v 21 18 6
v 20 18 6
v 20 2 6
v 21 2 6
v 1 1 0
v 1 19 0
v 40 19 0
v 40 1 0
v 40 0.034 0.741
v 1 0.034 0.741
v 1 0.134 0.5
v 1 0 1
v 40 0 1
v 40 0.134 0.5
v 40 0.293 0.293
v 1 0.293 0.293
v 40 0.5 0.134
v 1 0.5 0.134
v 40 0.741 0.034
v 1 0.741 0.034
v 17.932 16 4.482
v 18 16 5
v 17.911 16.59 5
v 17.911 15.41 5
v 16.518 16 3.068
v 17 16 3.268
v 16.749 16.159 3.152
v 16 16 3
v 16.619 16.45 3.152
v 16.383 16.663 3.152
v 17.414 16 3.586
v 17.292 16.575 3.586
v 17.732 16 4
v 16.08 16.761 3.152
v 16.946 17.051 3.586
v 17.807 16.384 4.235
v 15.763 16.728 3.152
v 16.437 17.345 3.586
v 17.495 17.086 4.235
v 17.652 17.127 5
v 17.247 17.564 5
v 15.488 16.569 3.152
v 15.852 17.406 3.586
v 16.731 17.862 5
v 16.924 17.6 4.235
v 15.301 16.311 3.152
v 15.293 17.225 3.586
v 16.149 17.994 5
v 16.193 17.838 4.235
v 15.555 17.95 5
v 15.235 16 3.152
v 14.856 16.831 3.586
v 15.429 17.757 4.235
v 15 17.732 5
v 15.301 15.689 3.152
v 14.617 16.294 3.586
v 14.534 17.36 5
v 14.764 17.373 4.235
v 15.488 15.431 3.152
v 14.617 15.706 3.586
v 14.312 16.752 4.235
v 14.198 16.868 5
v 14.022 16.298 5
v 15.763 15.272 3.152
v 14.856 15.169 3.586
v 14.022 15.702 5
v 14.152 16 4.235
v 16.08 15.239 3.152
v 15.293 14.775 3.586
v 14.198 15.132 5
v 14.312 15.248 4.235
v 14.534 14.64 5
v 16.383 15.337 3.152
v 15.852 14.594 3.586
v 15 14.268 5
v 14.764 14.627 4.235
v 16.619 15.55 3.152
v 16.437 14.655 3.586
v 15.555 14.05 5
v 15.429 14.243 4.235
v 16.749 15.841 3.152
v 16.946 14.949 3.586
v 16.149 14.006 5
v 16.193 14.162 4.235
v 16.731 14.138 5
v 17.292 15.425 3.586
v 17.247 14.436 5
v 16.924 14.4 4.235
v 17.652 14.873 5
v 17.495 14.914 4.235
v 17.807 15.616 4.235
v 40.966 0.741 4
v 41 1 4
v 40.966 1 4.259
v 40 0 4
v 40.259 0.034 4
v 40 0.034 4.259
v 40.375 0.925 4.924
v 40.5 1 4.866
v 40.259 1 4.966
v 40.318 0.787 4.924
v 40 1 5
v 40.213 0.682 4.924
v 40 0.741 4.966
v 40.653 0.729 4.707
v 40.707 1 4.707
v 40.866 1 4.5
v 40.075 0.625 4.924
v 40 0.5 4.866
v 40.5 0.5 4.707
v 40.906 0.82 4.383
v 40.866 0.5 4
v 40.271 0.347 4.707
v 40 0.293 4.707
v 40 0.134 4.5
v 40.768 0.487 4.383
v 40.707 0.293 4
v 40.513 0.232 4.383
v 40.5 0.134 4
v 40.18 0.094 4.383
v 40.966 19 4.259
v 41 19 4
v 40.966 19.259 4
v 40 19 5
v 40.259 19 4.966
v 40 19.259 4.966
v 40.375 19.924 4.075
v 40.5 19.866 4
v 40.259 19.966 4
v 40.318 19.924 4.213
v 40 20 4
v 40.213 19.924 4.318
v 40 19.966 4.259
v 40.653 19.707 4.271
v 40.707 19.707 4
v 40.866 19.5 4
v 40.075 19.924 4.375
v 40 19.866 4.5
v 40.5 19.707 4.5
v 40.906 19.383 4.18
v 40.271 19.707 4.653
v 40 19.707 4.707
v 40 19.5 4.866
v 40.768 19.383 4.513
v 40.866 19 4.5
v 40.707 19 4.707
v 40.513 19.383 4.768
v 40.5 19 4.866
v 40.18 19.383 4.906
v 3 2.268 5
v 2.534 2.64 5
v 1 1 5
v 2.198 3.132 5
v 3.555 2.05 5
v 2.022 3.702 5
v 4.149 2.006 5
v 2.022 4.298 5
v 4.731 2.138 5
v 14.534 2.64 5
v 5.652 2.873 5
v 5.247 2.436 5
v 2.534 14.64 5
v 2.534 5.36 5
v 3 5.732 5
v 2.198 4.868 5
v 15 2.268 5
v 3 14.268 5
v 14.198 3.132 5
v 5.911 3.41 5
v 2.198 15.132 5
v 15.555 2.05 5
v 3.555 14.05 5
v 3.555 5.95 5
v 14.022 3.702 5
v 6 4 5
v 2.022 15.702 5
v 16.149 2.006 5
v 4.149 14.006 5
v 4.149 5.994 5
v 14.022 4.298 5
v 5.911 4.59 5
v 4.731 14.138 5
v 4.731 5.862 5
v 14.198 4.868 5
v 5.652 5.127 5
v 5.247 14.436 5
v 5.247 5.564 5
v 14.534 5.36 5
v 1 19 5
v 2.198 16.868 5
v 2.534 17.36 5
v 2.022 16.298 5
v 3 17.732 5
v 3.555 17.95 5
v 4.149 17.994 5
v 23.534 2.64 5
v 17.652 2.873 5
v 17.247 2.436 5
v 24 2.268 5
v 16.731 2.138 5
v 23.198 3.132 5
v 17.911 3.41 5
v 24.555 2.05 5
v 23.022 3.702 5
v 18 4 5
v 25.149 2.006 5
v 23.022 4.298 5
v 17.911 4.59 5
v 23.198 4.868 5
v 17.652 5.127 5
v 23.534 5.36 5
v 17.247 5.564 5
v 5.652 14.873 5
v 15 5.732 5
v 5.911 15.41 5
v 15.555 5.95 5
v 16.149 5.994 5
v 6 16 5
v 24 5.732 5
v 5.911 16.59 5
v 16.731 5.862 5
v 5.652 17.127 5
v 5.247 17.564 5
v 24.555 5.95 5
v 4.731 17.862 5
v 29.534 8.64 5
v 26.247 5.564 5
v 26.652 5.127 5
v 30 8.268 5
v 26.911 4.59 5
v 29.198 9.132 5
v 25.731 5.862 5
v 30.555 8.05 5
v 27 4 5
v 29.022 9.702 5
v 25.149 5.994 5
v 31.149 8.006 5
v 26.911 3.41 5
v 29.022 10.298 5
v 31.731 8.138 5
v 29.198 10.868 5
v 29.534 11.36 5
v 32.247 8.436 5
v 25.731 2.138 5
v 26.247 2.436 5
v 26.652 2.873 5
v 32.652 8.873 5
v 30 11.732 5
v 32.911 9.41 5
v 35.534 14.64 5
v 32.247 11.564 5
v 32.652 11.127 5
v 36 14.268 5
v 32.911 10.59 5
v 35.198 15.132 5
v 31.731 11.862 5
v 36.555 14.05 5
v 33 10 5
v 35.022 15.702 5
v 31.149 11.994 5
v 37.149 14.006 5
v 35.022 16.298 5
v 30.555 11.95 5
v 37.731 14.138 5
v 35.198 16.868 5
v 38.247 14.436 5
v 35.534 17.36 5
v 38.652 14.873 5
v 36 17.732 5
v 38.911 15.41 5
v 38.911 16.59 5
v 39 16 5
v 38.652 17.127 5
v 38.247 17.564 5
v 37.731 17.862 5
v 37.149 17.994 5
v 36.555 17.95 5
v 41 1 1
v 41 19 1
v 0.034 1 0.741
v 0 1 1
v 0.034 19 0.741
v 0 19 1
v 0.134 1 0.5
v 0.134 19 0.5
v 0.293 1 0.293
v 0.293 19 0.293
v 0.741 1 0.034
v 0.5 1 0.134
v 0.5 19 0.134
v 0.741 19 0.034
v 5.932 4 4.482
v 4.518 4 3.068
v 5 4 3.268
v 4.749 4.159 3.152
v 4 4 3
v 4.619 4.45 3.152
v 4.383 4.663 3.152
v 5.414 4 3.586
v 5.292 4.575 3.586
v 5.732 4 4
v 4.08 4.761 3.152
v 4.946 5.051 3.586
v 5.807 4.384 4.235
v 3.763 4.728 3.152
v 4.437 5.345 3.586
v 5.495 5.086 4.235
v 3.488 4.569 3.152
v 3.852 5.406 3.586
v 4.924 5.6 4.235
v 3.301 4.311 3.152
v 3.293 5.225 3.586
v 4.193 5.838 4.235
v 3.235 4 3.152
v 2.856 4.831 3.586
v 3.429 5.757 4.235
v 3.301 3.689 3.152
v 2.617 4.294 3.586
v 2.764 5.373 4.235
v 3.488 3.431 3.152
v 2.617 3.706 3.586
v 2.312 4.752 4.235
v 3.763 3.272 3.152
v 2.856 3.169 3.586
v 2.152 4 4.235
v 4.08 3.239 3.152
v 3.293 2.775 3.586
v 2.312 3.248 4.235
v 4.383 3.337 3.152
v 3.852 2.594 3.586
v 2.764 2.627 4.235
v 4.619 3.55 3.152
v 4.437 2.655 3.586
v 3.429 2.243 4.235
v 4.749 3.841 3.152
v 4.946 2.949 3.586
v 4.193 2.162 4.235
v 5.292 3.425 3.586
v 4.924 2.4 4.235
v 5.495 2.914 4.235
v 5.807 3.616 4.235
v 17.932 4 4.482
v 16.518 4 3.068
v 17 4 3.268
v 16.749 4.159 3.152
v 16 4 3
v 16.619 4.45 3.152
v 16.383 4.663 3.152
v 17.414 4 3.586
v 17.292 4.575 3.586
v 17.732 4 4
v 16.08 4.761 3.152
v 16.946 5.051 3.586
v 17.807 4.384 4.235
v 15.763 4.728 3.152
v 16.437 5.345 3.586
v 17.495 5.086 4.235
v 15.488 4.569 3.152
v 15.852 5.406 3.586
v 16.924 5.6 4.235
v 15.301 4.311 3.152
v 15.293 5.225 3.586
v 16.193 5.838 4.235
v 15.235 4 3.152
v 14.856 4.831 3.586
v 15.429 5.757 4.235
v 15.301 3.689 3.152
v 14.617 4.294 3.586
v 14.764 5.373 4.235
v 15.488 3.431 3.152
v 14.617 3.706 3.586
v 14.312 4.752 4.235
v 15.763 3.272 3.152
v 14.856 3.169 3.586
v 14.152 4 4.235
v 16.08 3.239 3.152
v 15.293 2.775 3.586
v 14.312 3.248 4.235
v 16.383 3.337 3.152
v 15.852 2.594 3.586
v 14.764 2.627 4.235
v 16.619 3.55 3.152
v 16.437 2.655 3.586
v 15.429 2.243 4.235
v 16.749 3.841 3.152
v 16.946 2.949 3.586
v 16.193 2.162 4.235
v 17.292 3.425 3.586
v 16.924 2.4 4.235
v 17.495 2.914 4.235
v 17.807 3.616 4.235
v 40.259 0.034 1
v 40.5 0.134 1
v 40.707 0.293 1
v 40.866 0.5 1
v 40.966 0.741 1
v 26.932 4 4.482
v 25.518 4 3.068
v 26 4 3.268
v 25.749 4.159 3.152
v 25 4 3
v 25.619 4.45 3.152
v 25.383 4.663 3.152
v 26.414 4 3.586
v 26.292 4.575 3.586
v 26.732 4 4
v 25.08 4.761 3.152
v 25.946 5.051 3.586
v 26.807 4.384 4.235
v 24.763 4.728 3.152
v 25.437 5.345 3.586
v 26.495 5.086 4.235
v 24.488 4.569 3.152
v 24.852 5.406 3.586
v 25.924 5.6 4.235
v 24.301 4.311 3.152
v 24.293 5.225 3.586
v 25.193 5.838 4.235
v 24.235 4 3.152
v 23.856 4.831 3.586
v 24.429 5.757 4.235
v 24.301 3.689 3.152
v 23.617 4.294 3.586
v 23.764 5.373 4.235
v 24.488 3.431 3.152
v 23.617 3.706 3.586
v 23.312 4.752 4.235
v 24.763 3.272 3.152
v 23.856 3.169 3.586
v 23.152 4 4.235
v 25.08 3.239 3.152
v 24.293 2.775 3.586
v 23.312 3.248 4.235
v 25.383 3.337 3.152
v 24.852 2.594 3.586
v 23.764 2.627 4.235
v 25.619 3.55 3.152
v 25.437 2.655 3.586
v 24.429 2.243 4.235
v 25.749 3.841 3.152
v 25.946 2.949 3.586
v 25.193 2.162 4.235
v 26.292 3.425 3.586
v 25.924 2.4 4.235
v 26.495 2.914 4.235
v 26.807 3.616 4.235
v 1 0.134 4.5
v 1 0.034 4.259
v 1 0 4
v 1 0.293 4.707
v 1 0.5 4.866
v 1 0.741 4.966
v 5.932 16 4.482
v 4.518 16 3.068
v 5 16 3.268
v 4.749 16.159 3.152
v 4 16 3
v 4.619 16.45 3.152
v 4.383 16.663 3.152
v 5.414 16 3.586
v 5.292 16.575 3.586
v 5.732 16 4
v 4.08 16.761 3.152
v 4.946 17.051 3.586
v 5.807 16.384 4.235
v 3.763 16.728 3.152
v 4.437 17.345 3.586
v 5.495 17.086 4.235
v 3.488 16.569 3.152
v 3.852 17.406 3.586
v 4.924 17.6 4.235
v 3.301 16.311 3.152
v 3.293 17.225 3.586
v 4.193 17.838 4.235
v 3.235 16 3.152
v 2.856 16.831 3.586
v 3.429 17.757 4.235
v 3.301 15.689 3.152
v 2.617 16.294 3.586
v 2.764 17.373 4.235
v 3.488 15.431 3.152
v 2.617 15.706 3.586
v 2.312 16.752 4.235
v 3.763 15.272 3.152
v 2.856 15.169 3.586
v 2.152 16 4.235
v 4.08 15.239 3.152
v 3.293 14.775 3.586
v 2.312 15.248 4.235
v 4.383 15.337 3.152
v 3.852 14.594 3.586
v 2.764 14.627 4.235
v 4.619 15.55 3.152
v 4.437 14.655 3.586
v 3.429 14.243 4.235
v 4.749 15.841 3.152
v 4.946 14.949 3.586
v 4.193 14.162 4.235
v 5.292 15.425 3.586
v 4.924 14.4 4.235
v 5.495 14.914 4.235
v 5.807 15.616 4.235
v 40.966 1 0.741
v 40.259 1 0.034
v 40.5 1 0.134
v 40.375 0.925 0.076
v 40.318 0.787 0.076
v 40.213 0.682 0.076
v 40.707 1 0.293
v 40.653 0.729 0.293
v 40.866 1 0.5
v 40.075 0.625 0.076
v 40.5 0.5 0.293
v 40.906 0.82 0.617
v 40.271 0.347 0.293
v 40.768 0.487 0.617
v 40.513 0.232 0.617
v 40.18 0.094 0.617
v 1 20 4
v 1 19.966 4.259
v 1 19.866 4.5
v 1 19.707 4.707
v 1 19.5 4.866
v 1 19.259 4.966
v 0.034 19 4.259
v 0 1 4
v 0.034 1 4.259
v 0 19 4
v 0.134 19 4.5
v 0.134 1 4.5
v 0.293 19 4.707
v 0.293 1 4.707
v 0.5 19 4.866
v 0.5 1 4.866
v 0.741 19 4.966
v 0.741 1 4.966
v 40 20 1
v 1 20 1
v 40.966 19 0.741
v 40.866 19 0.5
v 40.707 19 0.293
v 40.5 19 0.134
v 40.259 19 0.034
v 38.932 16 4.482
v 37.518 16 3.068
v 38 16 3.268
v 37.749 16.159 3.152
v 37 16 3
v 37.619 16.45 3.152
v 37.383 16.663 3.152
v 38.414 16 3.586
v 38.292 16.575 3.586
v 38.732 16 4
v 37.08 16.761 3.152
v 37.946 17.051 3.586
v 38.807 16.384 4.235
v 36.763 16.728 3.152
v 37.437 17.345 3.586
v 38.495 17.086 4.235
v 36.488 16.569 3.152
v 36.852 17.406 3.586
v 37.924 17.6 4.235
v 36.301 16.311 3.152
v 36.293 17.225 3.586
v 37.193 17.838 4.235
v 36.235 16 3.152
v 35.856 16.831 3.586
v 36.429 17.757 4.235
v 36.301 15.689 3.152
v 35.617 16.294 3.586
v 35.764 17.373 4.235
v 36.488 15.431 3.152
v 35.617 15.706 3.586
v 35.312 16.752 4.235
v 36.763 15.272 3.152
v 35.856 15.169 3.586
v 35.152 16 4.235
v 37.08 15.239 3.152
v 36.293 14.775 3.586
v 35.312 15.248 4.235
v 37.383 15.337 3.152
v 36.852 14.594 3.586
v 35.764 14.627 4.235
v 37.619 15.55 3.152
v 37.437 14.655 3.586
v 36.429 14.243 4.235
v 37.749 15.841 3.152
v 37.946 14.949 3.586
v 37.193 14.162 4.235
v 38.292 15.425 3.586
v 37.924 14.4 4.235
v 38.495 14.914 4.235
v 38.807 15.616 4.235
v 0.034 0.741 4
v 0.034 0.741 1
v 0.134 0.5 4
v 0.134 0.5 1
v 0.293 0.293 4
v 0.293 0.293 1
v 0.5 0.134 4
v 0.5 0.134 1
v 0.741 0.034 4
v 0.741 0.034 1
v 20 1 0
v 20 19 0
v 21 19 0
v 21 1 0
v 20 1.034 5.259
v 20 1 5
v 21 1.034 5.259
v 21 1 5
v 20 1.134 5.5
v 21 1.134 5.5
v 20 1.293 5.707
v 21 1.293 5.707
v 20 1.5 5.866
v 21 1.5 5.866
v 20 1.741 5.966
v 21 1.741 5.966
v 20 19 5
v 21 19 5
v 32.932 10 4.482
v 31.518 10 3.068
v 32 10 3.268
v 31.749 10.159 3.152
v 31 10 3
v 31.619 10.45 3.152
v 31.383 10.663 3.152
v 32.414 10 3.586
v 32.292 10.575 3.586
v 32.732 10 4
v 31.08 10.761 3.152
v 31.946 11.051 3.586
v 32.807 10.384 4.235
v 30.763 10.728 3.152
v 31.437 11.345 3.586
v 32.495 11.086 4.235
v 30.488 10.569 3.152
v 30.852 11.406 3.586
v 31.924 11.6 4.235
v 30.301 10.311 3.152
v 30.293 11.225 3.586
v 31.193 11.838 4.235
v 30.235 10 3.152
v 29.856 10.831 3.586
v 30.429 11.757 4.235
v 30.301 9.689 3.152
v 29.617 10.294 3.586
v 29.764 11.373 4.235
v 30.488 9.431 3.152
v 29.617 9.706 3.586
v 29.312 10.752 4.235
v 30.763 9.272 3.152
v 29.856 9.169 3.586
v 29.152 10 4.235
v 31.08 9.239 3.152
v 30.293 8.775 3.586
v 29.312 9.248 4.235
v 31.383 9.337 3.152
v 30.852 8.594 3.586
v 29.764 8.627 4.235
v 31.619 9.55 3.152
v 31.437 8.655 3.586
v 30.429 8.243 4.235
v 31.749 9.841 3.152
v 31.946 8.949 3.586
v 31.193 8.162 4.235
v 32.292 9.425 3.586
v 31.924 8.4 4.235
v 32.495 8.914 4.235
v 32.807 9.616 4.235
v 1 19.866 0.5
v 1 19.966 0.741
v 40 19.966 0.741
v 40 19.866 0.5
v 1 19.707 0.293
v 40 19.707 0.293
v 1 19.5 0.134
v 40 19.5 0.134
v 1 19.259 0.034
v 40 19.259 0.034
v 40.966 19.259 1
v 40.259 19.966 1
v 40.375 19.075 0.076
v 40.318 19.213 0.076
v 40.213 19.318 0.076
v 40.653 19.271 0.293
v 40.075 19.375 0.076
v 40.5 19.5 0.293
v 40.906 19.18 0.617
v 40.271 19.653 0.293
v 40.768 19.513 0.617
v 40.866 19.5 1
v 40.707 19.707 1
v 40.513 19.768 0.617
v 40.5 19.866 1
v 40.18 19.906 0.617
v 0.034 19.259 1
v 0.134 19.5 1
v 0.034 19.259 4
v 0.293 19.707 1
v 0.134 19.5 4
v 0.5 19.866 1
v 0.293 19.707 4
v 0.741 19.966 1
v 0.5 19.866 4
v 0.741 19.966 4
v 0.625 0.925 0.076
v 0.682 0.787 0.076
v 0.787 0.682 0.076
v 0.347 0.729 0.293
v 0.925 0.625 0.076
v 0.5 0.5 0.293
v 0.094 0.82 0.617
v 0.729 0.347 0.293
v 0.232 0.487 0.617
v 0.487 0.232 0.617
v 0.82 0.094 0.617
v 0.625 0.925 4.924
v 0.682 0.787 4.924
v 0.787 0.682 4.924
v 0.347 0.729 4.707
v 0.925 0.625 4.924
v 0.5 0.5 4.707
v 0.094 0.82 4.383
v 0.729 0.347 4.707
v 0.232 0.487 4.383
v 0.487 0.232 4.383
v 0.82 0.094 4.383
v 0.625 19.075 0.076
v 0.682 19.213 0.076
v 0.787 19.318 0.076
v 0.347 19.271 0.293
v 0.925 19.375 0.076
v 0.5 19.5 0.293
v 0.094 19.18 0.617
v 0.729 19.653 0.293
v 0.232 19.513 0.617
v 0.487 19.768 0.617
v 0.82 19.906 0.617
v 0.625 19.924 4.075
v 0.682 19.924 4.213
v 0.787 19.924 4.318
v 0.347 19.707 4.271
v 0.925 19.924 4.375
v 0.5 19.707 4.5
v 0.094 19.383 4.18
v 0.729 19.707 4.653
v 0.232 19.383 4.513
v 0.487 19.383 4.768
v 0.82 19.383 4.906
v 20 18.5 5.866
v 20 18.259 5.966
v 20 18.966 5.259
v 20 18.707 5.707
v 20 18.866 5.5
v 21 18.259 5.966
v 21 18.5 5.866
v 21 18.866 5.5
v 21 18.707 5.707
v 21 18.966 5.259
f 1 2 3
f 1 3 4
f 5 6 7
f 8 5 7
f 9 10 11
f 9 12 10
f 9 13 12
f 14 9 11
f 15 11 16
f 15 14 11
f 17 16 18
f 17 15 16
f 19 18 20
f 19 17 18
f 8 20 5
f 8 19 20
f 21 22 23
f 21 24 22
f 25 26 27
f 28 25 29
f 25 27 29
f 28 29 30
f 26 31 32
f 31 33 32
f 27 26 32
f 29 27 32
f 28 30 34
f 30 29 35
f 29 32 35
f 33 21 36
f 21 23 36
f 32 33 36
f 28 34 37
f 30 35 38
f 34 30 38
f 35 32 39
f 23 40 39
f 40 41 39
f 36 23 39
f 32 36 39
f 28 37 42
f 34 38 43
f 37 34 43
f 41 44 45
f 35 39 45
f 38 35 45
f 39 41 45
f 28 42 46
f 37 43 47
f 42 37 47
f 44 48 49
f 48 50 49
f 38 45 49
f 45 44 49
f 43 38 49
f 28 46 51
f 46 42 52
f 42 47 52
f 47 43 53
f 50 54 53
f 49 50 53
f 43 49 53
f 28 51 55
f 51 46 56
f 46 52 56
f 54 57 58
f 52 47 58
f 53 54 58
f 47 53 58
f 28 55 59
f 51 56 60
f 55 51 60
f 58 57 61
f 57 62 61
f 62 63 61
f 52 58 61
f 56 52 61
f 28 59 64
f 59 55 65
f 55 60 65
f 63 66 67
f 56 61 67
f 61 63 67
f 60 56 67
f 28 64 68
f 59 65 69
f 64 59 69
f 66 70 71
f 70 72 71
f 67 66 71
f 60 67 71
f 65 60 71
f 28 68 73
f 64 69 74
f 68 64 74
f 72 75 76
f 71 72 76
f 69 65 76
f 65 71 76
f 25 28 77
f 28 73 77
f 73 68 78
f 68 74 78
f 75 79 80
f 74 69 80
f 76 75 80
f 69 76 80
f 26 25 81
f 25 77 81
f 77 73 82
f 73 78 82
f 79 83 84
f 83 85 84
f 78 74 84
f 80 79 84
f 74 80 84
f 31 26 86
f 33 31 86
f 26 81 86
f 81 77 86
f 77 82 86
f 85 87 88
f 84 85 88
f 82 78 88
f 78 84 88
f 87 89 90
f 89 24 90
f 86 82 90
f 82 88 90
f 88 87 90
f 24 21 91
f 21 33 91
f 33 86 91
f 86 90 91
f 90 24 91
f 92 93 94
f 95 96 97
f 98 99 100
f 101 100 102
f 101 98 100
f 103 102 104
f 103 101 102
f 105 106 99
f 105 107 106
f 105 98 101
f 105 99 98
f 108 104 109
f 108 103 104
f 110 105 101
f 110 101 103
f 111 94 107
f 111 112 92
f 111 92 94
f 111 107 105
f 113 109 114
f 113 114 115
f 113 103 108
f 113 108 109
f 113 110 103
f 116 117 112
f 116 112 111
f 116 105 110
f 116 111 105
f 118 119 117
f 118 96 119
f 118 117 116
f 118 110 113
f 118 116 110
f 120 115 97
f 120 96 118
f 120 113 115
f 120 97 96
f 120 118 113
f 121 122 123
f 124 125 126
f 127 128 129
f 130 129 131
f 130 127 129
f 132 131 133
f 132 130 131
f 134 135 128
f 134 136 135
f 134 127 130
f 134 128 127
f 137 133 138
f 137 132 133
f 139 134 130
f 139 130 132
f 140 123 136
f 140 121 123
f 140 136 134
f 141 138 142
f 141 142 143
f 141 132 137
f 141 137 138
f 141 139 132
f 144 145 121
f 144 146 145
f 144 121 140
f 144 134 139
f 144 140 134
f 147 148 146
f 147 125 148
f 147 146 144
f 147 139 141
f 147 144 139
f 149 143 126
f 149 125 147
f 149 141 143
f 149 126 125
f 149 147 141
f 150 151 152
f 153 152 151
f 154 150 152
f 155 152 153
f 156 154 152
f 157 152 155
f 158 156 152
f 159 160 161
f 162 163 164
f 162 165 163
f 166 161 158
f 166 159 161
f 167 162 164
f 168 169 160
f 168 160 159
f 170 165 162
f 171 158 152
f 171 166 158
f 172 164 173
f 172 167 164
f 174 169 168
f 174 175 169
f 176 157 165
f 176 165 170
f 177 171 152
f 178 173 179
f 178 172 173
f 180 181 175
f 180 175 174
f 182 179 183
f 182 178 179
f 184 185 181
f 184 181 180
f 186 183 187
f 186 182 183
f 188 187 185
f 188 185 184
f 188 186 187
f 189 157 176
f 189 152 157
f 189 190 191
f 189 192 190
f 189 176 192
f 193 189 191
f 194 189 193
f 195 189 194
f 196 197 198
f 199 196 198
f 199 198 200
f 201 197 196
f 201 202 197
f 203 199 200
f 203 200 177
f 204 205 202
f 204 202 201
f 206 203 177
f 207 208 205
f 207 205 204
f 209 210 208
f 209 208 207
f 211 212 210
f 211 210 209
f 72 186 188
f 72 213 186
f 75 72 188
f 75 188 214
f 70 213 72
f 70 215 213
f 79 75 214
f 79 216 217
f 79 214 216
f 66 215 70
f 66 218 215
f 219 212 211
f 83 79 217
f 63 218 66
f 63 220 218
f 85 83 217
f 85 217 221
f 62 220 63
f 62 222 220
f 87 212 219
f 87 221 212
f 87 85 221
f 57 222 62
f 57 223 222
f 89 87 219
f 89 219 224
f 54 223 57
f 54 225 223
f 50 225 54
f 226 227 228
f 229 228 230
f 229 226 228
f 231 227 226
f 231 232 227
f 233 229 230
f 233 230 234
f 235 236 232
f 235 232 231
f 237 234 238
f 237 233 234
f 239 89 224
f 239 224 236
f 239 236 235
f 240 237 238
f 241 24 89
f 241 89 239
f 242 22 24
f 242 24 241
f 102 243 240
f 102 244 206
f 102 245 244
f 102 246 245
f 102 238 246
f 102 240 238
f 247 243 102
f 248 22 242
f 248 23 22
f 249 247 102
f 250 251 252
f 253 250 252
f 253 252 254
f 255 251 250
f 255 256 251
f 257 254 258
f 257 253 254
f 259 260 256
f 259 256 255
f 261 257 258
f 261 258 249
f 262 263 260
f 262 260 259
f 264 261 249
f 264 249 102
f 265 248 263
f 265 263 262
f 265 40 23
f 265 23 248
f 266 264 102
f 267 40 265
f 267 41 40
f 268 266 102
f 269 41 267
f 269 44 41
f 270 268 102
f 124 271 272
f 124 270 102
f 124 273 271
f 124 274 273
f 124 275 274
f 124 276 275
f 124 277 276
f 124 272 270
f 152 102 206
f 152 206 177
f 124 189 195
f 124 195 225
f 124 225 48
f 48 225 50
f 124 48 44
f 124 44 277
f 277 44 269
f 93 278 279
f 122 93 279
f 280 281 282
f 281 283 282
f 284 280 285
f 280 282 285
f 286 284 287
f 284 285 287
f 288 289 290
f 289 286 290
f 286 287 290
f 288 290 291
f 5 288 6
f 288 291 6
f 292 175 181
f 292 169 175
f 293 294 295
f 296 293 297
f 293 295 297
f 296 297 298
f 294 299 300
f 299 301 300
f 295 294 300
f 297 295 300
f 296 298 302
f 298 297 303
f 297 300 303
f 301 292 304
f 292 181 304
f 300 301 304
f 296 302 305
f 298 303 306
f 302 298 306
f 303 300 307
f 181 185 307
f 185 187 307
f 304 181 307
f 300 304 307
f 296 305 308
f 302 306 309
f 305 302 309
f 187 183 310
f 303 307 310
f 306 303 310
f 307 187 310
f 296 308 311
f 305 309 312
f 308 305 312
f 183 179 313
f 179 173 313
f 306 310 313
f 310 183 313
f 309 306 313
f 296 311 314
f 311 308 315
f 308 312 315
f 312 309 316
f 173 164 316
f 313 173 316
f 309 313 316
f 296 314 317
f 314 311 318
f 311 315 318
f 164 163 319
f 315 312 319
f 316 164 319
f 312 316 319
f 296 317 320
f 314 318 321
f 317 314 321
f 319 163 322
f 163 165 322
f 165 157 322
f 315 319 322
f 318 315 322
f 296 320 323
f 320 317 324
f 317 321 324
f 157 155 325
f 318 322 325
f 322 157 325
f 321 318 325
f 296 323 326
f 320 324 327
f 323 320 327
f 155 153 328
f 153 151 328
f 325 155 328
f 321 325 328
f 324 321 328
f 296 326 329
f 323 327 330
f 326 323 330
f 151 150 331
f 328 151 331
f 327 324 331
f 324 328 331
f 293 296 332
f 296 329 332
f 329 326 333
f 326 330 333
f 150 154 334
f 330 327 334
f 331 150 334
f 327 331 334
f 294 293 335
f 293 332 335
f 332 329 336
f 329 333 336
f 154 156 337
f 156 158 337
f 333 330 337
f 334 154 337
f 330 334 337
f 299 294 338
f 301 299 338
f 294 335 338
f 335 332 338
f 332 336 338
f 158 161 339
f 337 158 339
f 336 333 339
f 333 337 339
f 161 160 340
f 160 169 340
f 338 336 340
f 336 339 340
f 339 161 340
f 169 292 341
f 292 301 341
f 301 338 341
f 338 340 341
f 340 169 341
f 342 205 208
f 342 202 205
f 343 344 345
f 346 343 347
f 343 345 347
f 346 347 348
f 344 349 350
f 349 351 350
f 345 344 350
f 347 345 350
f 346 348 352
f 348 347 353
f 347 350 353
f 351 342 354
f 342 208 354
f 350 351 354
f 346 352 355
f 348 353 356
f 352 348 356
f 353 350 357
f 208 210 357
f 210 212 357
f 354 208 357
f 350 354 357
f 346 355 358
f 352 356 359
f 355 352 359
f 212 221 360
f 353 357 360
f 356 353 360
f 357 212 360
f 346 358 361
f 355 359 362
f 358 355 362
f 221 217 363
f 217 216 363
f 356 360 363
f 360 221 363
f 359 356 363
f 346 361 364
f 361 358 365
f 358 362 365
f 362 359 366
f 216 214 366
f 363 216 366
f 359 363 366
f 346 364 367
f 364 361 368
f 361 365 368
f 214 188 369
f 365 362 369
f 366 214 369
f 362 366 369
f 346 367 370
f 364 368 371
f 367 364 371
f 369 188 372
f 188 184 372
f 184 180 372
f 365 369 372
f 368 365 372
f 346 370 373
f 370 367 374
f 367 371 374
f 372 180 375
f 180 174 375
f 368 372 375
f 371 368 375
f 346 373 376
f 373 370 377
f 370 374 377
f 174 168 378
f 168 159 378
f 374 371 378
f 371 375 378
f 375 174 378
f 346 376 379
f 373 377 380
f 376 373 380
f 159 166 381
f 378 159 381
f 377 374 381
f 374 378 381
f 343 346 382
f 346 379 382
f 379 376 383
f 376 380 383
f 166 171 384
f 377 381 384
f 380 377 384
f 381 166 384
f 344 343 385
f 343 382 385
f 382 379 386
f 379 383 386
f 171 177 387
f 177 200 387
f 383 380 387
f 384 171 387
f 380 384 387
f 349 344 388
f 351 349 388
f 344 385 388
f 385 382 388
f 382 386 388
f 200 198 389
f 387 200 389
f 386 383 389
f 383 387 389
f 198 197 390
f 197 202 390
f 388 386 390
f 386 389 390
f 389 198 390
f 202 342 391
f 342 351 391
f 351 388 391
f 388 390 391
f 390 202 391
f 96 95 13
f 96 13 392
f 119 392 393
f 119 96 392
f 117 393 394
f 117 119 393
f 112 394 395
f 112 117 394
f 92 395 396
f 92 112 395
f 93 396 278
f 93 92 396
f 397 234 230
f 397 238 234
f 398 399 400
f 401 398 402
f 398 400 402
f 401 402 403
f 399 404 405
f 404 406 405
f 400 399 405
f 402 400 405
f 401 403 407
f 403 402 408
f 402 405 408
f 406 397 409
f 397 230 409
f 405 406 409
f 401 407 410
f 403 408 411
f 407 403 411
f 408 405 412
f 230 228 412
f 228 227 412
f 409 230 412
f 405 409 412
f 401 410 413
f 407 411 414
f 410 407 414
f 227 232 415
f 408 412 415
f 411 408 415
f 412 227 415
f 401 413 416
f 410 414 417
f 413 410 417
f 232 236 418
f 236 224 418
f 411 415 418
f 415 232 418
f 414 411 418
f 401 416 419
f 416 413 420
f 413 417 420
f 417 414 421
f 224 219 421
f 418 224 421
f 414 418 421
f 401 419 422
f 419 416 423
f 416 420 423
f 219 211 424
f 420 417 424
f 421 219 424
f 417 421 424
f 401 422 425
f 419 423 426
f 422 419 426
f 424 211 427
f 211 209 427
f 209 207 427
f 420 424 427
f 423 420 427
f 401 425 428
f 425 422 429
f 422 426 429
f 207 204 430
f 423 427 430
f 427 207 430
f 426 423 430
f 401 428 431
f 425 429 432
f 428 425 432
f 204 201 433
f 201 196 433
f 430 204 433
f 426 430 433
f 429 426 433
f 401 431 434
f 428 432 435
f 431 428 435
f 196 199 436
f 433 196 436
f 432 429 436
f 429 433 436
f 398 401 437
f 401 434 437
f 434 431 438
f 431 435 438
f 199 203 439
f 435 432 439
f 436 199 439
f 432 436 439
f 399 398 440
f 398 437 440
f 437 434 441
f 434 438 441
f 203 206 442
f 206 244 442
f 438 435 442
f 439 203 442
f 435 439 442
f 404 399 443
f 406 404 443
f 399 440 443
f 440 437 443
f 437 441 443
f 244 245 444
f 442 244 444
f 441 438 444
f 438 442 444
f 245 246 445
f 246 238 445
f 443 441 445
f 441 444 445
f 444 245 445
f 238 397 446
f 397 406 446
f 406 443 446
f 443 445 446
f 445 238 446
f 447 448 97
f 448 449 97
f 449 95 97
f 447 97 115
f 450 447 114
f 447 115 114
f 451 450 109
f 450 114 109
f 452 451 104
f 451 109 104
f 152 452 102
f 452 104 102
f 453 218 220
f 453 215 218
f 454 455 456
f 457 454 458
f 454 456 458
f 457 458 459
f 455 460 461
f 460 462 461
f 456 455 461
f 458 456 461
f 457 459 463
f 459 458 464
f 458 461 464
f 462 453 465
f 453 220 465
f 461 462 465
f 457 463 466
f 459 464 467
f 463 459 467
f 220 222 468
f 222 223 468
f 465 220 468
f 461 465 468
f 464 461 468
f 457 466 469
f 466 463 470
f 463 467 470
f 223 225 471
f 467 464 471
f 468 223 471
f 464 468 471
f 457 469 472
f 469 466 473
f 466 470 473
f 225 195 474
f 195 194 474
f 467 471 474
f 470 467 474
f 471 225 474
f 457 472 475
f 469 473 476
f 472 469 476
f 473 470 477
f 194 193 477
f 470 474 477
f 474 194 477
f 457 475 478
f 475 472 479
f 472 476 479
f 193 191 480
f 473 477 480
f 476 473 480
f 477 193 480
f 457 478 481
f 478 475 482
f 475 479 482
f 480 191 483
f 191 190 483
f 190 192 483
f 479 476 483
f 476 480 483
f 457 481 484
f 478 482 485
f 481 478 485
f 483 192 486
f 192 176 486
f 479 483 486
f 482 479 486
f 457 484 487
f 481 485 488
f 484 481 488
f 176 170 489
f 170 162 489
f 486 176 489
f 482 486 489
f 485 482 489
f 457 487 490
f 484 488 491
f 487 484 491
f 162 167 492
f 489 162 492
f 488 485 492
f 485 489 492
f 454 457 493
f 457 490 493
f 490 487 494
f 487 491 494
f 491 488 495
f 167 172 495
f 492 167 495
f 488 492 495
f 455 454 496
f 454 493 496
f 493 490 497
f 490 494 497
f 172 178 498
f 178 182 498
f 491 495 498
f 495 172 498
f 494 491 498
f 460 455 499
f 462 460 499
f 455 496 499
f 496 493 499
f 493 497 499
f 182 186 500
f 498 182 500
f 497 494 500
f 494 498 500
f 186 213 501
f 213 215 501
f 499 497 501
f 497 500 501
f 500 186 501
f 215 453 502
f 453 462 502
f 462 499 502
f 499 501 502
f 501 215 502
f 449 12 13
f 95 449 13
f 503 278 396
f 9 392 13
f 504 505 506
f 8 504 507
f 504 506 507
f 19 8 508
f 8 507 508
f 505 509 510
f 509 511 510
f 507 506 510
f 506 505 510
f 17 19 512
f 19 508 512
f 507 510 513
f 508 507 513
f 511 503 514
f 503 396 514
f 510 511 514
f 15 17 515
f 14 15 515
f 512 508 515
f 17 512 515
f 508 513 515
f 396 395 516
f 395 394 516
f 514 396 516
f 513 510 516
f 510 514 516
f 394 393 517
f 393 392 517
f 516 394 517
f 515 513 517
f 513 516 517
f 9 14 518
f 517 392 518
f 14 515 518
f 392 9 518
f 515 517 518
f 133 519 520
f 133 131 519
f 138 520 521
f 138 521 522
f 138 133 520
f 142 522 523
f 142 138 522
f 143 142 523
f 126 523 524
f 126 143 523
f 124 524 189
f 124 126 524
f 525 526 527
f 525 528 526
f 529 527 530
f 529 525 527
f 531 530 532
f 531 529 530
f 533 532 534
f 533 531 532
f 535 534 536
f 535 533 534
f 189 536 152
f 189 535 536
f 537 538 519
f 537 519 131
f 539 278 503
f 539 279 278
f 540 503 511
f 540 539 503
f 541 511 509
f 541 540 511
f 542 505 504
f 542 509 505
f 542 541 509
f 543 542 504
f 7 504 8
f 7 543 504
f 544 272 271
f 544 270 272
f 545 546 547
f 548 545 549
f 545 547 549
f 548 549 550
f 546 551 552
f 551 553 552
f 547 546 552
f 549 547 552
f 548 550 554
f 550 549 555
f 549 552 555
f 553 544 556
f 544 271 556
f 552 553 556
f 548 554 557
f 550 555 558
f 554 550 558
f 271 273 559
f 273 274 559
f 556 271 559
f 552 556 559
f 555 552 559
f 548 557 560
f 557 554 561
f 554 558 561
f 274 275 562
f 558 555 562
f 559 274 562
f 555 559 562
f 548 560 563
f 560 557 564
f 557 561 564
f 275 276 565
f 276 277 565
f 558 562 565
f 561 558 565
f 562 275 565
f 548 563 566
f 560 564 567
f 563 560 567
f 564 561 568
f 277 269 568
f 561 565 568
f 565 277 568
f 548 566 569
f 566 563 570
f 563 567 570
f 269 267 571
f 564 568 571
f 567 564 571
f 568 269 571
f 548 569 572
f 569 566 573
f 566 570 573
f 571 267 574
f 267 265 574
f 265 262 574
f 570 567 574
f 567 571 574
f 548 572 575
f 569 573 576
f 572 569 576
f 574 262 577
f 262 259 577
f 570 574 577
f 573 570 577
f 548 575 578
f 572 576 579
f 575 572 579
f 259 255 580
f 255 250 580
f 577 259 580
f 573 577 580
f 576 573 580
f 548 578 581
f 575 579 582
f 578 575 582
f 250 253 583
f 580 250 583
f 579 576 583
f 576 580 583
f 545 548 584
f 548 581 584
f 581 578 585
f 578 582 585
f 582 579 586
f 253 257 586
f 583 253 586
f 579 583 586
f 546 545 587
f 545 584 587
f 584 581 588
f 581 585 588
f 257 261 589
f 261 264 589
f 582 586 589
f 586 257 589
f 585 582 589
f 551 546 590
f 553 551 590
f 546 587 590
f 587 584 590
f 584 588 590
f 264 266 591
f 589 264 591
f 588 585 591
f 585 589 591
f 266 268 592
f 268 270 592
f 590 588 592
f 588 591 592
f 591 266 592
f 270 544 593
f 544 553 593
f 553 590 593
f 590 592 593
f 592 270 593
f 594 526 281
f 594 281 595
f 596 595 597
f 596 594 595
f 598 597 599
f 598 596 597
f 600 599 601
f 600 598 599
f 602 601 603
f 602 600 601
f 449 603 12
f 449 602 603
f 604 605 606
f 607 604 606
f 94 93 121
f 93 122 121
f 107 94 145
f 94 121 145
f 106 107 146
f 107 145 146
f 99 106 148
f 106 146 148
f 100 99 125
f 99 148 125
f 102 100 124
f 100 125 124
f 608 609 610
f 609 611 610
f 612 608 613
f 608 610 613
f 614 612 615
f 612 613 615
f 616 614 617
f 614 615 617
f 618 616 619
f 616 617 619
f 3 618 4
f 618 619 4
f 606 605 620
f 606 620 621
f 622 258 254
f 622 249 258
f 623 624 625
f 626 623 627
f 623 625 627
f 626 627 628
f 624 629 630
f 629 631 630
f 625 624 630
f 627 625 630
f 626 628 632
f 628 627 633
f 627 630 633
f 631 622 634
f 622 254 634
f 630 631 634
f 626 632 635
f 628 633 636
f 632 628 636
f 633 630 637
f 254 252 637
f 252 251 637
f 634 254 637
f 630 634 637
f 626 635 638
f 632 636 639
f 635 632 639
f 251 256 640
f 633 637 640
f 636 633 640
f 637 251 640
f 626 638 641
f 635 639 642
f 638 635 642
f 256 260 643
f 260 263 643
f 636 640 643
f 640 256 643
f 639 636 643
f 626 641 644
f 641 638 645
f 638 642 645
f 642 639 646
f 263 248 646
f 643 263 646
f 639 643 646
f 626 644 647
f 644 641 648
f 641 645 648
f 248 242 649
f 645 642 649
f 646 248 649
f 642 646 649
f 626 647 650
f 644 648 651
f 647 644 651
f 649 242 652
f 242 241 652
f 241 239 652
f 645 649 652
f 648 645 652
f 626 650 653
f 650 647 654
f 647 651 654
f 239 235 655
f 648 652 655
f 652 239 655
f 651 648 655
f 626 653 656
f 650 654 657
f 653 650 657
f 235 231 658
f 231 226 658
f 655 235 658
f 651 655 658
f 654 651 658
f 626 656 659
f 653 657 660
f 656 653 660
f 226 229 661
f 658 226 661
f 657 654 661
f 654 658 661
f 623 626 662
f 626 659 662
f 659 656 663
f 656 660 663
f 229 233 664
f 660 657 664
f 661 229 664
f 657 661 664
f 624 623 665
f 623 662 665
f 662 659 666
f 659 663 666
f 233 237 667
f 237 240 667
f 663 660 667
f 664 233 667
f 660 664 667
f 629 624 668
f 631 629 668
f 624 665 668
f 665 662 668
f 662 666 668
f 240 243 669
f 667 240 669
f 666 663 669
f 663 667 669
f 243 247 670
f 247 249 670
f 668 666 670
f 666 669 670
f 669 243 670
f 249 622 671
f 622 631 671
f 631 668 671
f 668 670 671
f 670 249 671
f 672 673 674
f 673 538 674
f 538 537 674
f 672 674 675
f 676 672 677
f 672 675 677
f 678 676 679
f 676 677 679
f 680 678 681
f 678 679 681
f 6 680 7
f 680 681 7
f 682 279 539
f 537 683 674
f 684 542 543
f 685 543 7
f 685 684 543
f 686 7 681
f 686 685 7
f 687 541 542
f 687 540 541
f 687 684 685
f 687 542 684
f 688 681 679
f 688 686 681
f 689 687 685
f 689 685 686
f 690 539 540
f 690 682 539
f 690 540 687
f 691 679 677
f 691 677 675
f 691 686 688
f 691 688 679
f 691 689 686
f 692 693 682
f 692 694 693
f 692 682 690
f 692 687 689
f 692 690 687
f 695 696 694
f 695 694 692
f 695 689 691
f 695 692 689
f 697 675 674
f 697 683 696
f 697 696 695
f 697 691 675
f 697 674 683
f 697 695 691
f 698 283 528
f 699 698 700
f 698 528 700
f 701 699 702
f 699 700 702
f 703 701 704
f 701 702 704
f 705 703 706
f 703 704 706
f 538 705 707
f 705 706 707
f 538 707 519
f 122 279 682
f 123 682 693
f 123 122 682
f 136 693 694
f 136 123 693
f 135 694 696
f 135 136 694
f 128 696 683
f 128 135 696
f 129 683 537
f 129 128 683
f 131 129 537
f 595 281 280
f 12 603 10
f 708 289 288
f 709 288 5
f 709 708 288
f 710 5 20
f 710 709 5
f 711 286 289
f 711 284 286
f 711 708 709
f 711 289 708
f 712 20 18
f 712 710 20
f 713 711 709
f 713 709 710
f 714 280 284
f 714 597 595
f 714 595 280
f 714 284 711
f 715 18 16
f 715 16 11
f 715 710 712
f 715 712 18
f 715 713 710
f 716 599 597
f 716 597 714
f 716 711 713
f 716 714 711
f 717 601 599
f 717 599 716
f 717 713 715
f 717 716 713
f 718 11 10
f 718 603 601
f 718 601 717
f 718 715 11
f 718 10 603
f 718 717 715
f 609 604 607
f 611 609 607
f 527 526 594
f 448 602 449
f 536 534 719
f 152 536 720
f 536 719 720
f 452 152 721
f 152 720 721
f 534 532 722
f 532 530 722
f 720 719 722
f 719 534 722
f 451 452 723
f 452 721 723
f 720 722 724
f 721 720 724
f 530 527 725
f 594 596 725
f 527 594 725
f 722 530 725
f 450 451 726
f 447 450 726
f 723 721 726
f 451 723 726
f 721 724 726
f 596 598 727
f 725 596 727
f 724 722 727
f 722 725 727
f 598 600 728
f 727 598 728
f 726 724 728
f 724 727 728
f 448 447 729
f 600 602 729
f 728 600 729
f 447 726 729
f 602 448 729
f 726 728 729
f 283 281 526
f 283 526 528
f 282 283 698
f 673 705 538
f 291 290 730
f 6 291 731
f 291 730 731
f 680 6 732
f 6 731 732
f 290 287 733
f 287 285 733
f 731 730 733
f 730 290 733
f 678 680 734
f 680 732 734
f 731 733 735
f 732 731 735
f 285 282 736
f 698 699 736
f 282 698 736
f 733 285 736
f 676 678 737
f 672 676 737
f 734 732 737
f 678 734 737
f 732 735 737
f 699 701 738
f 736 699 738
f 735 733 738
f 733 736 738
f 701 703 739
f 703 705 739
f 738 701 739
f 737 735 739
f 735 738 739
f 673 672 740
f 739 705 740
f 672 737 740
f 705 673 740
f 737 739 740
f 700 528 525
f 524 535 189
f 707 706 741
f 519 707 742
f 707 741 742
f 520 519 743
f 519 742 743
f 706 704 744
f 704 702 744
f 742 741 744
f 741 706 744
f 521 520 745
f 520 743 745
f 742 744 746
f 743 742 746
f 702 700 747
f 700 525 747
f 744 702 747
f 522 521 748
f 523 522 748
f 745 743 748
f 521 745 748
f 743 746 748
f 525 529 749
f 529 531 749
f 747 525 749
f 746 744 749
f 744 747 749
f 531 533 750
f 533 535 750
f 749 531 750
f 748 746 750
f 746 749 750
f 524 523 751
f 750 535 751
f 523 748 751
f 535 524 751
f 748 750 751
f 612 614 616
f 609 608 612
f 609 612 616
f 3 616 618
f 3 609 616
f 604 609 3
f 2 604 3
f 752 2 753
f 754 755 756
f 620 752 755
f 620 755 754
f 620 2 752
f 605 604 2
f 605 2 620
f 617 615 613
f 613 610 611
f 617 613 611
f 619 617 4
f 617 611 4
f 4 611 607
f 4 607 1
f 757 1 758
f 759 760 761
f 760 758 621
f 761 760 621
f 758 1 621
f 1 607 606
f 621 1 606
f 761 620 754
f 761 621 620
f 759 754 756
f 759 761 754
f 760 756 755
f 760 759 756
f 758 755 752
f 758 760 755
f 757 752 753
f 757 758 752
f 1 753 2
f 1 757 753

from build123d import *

# Parameters (mm, degrees)
BOX_W        = 41
BOX_H        = 20
BOX_DEPTH    = 5
FILLET_R     = 1
BOX001_W     = 1
BOX001_H     = 18
BOX001_DEPTH = 6
FILLET001_R  = 1


with BuildPart() as esfera005:
    # Sphere005 → Sphere005 (revolve)
    with BuildSketch(Plane(origin=(37, 16, 5), x_dir=(1, 0, 0), z_dir=(0, -1, 0))):
        with BuildLine():
            ThreePointArc((0, -2), (2, 0), (0, 2))
            Line((0, 2), (0, -2))
        make_face()
    revolve(axis=Axis((37, 16, 5), (0, 0, 1)))


with BuildPart() as esfera003:
    # Sphere003 → Sphere003 (revolve)
    with BuildSketch(Plane(origin=(16, 16, 5), x_dir=(1, 0, 0), z_dir=(0, -1, 0))):
        with BuildLine():
            ThreePointArc((0, -2), (2, 0), (0, 2))
            Line((0, 2), (0, -2))
        make_face()
    revolve(axis=Axis((16, 16, 5), (0, 0, 1)))


with BuildPart() as esfera004:
    # Sphere004 → Sphere004 (revolve)
    with BuildSketch(Plane(origin=(25, 4, 5), x_dir=(1, 0, 0), z_dir=(0, -1, 0))):
        with BuildLine():
            ThreePointArc((0, -2), (2, 0), (0, 2))
            Line((0, 2), (0, -2))
        make_face()
    revolve(axis=Axis((25, 4, 5), (0, 0, 1)))


with BuildPart() as esfera001:
    # Sphere001 → Sphere001 (revolve)
    with BuildSketch(Plane(origin=(4, 16, 5), x_dir=(1, 0, 0), z_dir=(0, -1, 0))):
        with BuildLine():
            ThreePointArc((0, -2), (2, 0), (0, 2))
            Line((0, 2), (0, -2))
        make_face()
    revolve(axis=Axis((4, 16, 5), (0, 0, 1)))


with BuildPart() as esfera002:
    # Sphere002 → Sphere002 (revolve)
    with BuildSketch(Plane(origin=(16, 4, 5), x_dir=(1, 0, 0), z_dir=(0, -1, 0))):
        with BuildLine():
            ThreePointArc((0, -2), (2, 0), (0, 2))
            Line((0, 2), (0, -2))
        make_face()
    revolve(axis=Axis((16, 4, 5), (0, 0, 1)))


with BuildPart() as esfera006:
    # Sphere006 → Sphere006 (revolve)
    with BuildSketch(Plane(origin=(31, 10, 5), x_dir=(1, 0, 0), z_dir=(0, -1, 0))):
        with BuildLine():
            ThreePointArc((0, -2), (2, 0), (0, 2))
            Line((0, 2), (0, -2))
        make_face()
    revolve(axis=Axis((31, 10, 5), (0, 0, 1)))


with BuildPart() as fusion:
    # Sphere → Sphere (revolve)
    with BuildSketch(Plane(origin=(4, 4, 5), x_dir=(1, 0, 0), z_dir=(0, -1, 0))):
        with BuildLine():
            ThreePointArc((0, -2), (2, 0), (0, 2))
            Line((0, 2), (0, -2))
        make_face()
    revolve(axis=Axis((4, 4, 5), (0, 0, 1)))

    # Fusion: union Esfera005, Esfera003, Esfera004, Esfera001, Esfera002, Esfera006
    add(esfera005.part)
    add(esfera003.part)
    add(esfera004.part)
    add(esfera001.part)
    add(esfera002.part)
    add(esfera006.part)


with BuildPart() as cut:
    # Box → Box (new body)
    with BuildSketch(Plane.XY):
        with Locations((20.5, 10)):
            Rectangle(BOX_W, BOX_H)
    extrude(amount=BOX_DEPTH)

    # Fillet
    fillet_edges = [cut.edges().sort_by_distance(p)[0] for p in [
        (0, 0, 2.5),
        (0, 10, 5),
        (0, 20, 2.5),
        (0, 10, 0),
        (41, 0, 2.5),
        (41, 10, 5),
        (41, 20, 2.5),
        (41, 10, 0),
        (20.5, 0, 0),
        (20.5, 0, 5),
        (20.5, 20, 0),
        (20.5, 20, 5),
    ]]
    fillet(fillet_edges, radius=FILLET_R)

    # Cut: cut Fusion
    add(fusion.part, mode=Mode.SUBTRACT)


with BuildPart() as fillet001:
    # Box001 → Box001 (new body)
    with BuildSketch(Plane(origin=(20, 1, 0), x_dir=(1, 0, 0), z_dir=(0, 0, 1))):
        with Locations((0.5, 9)):
            Rectangle(BOX001_W, BOX001_H)
    extrude(amount=BOX001_DEPTH)

    # Fillet001
    fillet001_edges = [fillet001.edges().sort_by_distance(p)[0] for p in [
        (20.5, 1, 6),
        (20.5, 19, 6),
    ]]
    fillet(fillet001_edges, radius=FILLET001_R)


solid = Compound([cut.part, fillet001.part])
